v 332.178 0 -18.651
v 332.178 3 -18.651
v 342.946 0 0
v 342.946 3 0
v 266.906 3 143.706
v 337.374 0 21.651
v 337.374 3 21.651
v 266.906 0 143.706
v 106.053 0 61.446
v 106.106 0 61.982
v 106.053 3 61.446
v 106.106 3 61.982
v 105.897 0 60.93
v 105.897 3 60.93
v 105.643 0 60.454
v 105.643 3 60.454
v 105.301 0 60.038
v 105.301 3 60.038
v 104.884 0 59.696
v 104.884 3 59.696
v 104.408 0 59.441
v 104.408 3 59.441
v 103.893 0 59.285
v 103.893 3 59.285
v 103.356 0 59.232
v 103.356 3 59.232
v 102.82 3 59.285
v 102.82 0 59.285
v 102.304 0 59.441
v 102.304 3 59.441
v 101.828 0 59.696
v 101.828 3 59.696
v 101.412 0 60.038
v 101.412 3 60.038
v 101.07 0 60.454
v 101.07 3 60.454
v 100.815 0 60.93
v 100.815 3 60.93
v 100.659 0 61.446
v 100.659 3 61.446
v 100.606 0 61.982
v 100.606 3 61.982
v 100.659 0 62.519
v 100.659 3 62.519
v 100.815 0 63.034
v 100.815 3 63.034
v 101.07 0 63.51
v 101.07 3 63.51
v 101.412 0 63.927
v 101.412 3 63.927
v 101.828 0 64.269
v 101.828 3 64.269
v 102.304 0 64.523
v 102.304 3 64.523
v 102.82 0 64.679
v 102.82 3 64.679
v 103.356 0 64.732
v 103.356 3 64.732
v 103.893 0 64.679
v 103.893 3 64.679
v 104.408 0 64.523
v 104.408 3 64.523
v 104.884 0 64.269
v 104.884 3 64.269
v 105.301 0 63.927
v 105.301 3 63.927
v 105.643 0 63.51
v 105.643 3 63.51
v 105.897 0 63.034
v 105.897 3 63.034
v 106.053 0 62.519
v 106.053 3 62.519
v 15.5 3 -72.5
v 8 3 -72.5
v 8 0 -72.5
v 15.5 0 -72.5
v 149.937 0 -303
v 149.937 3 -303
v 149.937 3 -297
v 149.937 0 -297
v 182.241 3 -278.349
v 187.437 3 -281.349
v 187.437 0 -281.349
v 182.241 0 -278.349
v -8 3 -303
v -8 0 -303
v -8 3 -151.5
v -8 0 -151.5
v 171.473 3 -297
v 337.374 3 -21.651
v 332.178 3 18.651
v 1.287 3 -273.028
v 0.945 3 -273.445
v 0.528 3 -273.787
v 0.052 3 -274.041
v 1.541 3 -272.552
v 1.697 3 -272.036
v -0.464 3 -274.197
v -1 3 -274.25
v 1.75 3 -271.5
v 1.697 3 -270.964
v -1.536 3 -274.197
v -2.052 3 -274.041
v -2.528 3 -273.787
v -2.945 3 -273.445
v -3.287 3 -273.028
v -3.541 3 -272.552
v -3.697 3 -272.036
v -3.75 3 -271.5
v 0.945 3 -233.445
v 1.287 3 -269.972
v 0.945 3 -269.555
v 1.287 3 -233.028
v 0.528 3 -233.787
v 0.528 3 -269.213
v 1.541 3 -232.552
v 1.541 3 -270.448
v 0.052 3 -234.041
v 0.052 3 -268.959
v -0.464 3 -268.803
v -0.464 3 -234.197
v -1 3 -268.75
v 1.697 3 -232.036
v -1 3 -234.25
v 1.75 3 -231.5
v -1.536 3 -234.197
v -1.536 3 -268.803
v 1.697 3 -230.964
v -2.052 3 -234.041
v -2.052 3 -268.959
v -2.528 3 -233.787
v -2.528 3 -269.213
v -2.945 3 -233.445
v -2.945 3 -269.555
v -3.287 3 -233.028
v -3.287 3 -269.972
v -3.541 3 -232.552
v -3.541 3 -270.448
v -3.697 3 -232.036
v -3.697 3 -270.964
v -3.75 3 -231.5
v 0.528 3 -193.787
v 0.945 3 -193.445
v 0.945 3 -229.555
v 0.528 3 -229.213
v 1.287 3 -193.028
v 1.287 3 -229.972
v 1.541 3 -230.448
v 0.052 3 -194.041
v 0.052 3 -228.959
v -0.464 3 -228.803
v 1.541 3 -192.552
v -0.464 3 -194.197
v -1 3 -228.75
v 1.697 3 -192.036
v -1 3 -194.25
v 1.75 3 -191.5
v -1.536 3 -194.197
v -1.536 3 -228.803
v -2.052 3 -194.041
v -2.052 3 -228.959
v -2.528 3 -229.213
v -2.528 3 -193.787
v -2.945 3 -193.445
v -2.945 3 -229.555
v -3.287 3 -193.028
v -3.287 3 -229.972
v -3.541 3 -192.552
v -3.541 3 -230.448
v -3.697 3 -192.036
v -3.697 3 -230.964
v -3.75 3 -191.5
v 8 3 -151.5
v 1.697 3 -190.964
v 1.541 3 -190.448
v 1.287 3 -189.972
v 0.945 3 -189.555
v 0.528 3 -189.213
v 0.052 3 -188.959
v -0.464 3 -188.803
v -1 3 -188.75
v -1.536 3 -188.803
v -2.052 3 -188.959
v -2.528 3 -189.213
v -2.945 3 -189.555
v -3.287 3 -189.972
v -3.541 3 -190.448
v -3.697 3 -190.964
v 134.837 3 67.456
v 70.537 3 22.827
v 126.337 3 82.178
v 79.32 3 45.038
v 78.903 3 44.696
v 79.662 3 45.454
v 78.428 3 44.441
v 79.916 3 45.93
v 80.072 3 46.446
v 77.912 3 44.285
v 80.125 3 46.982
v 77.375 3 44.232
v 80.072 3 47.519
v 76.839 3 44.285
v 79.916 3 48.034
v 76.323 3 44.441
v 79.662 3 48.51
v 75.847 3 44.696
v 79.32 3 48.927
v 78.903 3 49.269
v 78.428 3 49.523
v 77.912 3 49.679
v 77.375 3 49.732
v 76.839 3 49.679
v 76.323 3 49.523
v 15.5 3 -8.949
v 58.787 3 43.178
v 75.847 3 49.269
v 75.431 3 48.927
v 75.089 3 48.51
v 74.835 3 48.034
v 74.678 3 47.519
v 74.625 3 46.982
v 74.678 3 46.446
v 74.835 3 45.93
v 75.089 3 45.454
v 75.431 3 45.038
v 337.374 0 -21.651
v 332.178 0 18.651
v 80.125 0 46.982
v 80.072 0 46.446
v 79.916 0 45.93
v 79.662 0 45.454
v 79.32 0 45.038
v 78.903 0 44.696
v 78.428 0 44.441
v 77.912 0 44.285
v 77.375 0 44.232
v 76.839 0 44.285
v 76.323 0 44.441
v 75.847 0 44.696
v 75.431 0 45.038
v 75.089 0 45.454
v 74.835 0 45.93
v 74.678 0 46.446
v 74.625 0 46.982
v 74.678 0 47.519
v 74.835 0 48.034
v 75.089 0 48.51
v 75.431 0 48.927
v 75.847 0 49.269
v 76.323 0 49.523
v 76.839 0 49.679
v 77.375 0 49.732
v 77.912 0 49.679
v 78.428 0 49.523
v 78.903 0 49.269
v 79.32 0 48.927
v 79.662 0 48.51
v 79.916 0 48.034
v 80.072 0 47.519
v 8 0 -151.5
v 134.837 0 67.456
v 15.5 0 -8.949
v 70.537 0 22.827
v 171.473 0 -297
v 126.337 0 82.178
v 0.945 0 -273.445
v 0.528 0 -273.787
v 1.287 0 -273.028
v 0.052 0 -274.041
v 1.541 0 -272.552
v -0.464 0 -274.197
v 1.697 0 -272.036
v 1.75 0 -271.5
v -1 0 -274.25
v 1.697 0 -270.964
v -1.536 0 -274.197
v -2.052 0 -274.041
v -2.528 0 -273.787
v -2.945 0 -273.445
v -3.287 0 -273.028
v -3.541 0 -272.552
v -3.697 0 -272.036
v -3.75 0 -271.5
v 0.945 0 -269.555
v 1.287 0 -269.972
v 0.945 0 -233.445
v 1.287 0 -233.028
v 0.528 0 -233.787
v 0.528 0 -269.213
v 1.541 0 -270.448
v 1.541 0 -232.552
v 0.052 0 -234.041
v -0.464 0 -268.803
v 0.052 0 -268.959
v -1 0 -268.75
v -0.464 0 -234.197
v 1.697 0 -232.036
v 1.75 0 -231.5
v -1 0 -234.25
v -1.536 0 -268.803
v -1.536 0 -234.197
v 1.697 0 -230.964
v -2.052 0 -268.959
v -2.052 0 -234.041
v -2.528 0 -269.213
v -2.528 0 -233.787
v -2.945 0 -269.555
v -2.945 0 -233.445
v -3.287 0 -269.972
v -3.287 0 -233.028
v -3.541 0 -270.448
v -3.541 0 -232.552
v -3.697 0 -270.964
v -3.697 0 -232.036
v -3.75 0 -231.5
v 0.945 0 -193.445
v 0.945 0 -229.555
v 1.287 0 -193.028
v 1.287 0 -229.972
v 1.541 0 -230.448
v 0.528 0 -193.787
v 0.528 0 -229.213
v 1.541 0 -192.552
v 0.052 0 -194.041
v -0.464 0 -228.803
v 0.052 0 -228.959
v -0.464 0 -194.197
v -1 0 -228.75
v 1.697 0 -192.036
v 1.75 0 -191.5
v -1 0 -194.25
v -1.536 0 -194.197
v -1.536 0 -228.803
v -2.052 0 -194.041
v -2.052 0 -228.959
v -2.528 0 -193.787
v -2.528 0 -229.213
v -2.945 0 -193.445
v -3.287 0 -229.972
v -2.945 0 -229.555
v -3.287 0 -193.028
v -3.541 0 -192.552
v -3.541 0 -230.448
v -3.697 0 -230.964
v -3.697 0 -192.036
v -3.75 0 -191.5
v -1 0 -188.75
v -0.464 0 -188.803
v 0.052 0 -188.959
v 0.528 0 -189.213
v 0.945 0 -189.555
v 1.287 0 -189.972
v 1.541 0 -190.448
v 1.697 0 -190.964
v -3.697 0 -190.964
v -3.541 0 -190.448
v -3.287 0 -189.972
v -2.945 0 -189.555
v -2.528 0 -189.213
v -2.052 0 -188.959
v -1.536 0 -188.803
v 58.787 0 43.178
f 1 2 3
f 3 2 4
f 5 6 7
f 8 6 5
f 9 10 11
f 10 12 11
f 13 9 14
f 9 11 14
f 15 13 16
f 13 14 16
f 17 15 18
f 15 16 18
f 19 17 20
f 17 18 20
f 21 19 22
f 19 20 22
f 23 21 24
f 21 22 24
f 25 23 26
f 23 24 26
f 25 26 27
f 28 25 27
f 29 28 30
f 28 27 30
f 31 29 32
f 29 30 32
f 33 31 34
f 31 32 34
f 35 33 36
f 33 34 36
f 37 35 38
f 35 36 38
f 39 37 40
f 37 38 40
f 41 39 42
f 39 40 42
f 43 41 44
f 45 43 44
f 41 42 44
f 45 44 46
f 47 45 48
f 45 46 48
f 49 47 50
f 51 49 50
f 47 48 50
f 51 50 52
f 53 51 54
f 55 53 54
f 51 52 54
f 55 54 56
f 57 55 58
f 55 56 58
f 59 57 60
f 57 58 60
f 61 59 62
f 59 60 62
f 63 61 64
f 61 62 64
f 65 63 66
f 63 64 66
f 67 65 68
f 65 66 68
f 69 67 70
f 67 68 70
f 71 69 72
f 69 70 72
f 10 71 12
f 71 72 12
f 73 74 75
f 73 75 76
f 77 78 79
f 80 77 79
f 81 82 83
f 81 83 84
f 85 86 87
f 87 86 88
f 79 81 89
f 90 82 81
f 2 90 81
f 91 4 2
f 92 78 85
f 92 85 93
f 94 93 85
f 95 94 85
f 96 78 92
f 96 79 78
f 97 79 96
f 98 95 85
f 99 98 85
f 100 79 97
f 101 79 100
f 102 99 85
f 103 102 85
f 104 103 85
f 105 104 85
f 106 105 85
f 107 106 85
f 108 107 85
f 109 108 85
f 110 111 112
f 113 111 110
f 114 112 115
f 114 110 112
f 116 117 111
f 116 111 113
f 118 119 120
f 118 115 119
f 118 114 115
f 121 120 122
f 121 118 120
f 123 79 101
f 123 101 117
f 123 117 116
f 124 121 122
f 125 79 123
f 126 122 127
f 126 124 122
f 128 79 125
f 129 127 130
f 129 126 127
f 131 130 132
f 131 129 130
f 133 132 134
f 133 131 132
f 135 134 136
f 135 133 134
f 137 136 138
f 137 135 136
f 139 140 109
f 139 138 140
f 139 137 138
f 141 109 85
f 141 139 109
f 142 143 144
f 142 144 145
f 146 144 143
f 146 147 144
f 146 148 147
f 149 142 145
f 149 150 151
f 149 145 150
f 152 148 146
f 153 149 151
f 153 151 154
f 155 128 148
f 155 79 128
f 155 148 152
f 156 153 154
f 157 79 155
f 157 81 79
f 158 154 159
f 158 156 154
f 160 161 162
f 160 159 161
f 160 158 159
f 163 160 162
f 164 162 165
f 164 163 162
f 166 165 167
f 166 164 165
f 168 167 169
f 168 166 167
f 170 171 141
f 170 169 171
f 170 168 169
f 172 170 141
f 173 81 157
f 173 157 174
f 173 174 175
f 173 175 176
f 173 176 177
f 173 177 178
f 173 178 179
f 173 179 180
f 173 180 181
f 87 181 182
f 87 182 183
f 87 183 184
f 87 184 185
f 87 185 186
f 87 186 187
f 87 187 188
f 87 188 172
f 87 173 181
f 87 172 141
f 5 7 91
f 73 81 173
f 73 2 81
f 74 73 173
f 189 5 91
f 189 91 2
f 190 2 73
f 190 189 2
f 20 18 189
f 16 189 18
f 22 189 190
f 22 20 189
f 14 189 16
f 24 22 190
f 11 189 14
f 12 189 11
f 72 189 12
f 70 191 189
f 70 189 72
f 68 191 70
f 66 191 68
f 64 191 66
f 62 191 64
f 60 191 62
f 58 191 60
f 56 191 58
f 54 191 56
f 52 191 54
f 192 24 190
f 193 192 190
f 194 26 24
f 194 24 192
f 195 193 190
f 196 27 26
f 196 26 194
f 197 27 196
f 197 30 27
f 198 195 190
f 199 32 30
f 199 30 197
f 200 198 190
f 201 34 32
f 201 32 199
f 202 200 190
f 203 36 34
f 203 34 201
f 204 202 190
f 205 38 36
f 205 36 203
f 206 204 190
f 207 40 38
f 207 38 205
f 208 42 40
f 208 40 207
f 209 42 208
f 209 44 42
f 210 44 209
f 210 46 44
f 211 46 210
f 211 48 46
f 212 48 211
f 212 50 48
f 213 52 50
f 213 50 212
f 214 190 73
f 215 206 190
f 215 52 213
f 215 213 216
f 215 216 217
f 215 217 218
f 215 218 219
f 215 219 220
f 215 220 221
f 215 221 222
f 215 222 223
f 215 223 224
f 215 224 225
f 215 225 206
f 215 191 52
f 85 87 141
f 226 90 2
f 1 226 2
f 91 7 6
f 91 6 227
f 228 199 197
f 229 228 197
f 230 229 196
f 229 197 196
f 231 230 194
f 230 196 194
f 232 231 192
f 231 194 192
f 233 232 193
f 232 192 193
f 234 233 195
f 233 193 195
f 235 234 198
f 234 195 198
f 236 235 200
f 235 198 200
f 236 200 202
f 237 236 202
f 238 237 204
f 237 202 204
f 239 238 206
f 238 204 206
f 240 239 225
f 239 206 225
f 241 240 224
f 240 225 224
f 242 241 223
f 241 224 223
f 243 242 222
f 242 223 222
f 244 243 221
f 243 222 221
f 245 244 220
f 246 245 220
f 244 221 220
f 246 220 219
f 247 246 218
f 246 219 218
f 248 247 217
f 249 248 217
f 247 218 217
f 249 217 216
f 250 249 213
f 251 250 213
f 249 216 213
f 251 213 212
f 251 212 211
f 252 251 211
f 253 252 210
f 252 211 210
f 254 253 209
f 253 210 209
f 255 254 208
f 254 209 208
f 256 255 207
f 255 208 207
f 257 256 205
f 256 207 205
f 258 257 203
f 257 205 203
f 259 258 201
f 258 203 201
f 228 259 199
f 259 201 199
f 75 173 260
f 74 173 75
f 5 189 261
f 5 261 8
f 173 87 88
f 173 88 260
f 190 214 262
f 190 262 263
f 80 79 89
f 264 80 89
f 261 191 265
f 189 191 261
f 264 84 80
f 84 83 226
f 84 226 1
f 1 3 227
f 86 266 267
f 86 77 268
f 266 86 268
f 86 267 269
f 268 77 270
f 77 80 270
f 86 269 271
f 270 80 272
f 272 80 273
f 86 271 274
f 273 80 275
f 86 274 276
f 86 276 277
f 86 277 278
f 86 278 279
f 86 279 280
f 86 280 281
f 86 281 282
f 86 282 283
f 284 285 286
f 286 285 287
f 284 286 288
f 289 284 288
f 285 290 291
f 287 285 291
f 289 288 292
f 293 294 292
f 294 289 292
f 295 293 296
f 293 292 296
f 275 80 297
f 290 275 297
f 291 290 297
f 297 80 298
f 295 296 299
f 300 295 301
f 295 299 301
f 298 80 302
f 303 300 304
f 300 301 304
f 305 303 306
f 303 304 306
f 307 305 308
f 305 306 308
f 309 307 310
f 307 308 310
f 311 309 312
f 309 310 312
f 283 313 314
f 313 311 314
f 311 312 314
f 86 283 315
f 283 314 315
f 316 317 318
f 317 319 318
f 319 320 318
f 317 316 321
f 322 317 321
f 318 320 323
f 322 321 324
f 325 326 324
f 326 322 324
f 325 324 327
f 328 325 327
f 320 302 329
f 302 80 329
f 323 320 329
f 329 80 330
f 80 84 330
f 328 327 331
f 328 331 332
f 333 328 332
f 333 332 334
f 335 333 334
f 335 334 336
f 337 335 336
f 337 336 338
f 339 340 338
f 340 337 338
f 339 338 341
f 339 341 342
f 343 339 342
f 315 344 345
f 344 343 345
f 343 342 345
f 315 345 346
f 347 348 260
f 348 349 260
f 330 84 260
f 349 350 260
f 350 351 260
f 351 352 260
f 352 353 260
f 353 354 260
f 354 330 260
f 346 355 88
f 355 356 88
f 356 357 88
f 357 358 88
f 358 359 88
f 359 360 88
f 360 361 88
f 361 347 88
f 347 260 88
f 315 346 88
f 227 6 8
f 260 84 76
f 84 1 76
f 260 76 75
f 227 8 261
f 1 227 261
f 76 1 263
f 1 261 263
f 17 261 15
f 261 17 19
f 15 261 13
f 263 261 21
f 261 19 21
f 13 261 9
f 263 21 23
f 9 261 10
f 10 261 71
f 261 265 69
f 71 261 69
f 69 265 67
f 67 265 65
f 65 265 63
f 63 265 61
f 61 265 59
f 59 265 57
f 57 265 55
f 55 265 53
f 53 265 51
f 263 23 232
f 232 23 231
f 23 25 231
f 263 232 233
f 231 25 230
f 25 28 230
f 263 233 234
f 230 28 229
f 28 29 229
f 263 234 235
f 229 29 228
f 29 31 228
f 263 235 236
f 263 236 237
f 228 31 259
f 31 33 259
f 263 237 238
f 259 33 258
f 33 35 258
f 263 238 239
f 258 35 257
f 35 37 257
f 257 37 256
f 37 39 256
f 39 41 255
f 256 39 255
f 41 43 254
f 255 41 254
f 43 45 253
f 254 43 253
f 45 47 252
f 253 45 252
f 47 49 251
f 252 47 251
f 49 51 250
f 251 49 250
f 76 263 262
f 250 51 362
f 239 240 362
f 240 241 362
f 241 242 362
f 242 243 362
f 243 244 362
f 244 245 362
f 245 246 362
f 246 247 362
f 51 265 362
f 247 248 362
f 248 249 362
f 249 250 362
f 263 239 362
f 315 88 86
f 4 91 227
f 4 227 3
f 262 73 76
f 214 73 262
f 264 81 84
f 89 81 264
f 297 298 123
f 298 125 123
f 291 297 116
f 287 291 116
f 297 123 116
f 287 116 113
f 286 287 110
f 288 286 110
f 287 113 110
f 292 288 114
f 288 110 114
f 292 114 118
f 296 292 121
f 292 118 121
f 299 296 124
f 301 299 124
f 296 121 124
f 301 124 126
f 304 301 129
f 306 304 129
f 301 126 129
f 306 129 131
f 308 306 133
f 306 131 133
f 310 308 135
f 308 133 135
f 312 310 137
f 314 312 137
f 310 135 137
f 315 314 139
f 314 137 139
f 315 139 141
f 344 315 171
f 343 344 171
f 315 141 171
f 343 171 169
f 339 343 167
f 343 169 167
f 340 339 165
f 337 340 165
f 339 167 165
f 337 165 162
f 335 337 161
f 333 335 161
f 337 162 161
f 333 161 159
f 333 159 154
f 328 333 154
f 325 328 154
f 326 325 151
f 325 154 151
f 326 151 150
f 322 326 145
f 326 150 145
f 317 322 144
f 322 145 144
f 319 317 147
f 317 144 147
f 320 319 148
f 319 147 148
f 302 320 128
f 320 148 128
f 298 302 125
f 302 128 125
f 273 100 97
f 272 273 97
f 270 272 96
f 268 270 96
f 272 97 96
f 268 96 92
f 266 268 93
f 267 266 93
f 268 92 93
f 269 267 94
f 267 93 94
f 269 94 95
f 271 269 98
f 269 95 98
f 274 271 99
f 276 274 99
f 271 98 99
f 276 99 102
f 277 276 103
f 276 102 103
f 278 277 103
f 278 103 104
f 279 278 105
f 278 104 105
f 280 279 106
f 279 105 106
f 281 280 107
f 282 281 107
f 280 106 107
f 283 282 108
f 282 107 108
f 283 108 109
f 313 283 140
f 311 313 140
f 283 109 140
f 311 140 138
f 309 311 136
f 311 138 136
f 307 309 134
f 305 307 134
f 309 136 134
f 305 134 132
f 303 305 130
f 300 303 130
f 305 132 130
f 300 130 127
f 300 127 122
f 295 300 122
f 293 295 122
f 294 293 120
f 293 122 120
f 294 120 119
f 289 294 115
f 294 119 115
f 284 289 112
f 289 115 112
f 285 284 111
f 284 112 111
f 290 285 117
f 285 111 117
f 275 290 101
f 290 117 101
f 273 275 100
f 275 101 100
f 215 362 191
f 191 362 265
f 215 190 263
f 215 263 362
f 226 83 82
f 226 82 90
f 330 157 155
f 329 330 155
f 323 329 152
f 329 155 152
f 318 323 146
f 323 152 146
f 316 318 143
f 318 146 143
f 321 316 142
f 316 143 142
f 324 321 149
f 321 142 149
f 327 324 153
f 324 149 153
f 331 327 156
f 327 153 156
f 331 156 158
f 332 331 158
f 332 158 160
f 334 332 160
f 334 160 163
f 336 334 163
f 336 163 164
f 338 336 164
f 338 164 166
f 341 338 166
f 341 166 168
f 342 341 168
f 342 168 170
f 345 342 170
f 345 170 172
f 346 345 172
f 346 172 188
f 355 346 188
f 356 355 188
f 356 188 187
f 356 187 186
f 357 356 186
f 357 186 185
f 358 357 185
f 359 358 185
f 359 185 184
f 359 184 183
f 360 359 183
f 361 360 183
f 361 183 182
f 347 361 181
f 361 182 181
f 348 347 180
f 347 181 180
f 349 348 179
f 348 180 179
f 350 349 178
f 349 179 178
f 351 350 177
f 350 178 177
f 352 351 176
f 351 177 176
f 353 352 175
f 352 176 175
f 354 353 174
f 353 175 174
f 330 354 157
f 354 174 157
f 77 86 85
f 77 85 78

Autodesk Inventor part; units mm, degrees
ref_plane "YZ Plane" through (0, 0, 0) normal (1, 0, 0) x (0, 1, 0)
ref_plane "XZ Plane" through (0, 0, 0) normal (0, 1, 0) x (-1, 0, 0)
ref_plane "XY Plane" through (0, 0, 0) normal (0, 0, 1) x (1, 0, 0)
sketch "Sketch1" plane through (0, 0, 0) normal (0, 1, 0) x (-1, 0, 0)
  line L0 (349.8743, 0) -> (258.4057, -158.4282)
  line L1 (174.9371, -303) -> (-174.9371, -303)
  line L2 (-174.9371, -303) -> (-349.8743, 0)
  line L3 (-349.8743, 0) -> (-174.9371, 303)
  line L4 (-174.9371, 303) -> (174.9371, 303)
  line L5 (258.4057, 158.4282) -> (349.8743, 0)
  line L6 (0, 0) -> (-8, 0)
  line L7 (-8, 0) -> (-8, -303)
  line L8 (-8, -303) -> (8, -303)
  line L9 (8, -303) -> (8, 0)
  line L10 (8, 0) -> (-8, 0)
  circle A0 centre (0, 0) radius 2.5
  line L11 (258.4057, 158.4282) -> (-4, 6.9282)
  line L12 (4, -6.9282) -> (266.4057, 144.5718)
  line L13 (-4, 6.9282) -> (4, -6.9282)
  line L14 (-266.4057, 144.5718) -> (-4, -6.9282)
  line L15 (4, 6.9282) -> (-258.4057, 158.4282)
  line L16 (-4, -6.9282) -> (4, 6.9282)
  line L17 (8, -4.6188) -> (8, -151.5)
  line L18 (8, -151.5) -> (-8, -151.5)
  line L19 (-8, -151.5) -> (-8, -303)
  line L20 (-8, -4.6188) -> (-4, -6.9282)
  line L21 (4, -6.9282) -> (-4, -6.9282)
  line L22 (-266.4057, 144.5718) -> (-258.4057, 158.4282)
  line L23 (-127.2028, 82.6782) -> (-135.2028, 68.8218)
  line L24 (-135.2028, 68.8218) -> (-8, -4.6188)
  line L25 (-266.4057, 144.5718) -> (-349.8743, 0)
  line L26 (-174.9371, -303) -> (-349.8743, 0)
  line L27 (-174.9371, -303) -> (-8, -303)
  line L28 (0, 9.2376) -> (8, 0)
  dimension "d0" = 303
  dimension "d1" = 303
  dimension "d2" = 8
  dimension "d3" = 16
  dimension "d4" = 5
  dimension "d7" = 360
extrude "Extrusion1" add sketch "Sketch1" along normal blind 3 contours L1 L7 L18 L9 | L1 L2 L3 L14 L7 | L18 L7 L14 L21 L12 L9 | L12 L13 A0 L10 L9 | L14 L23 L15 L11 L13 A0 L6 L7 | L7 L6 A0 L16 L14 | L10 A0 L16 L28 | L21 L16 A0 L13 | L3 L15 L23 L14 | A0 L13 L10 | L10 L16 A0 | L28 L15 L16 | L16 A0 L13 L11 L28 | A0 L16 L13 | A0 L13 L6 | L6 L16 A0 | L13 A0 L16
sketch "Sketch2" plane through (0, 3, 0) normal (0, 1, 0) x (1, 0, 0)
  line L0 (-8, 303) -> (-8, 0) projected
  line L1 (-8, 0) -> (-8, 151.5)
  line L2 (-8, 151.5) -> (8, 151.5)
  line L3 (8, 151.5) -> (8, 0)
  line L4 (8, 0) -> (-8, 0)
  line L5 (0, -9.2376) -> (258.4057, -158.4282) projected
  line L6 (258.4057, -158.4282) -> (126.3368, -82.1782)
  line L7 (126.3368, -82.1782) -> (134.8368, -67.4558)
  line L8 (134.8368, -67.4558) -> (266.9057, -143.7058)
  line L9 (266.9057, -143.7058) -> (258.4057, -158.4282)
  point P0 (0, 0)
  dimension "d11" = 151.5
  dimension "d12" = 16
  dimension "d13" = 152.5
  dimension "d14" = 17
extrude "Extrusion2" cut sketch "Sketch2" against normal blind 3
sketch "Sketch3" plane through (0, 3, 0) normal (0, 1, 0) x (1, 0, 0)
  line L0 (174.9371, 303) -> (-8, 303) projected
  line L1 (174.9371, 303) -> (149.9371, 303)
  line L2 (149.9371, 303) -> (149.9371, 297)
  line L3 (149.9371, 297) -> (174.9371, 297)
  line L4 (174.9371, 297) -> (174.9371, 303)
  line L5 (349.8743, 0) -> (174.9371, 303) projected
  line L6 (174.9371, 303) -> (187.4371, 281.3494)
  line L7 (187.4371, 281.3494) -> (182.241, 278.3494)
  line L8 (182.241, 278.3494) -> (169.741, 300)
  line L9 (169.741, 300) -> (174.9371, 303)
  line L10 (349.8743, 0) -> (337.3743, 21.6506)
  line L11 (337.3743, 21.6506) -> (332.1781, 18.6506)
  line L12 (332.1781, 18.6506) -> (344.6781, -3)
  line L13 (344.6781, -3) -> (349.8743, 0)
  line L14 (349.8743, 0) -> (337.3743, -21.6506)
  line L15 (337.3743, -21.6506) -> (332.1781, -18.6506)
  line L16 (332.1781, -18.6506) -> (344.6781, 3)
  line L17 (344.6781, 3) -> (349.8743, 0)
  line L18 (349.8743, 0) -> (266.9057, -143.7058) projected
  line L19 (349.8743, 0) -> (374.8743, 0) construction
  point P0 (0, 0)
  dimension "d17" = 25
  dimension "d18" = 6
  dimension "d19" = 25
  dimension "d20" = 6
  dimension "d21" = 25
  dimension "d22" = 6
  dimension "d23" = 25
  dimension "d24" = 120
  dimension "d25" = 6
extrude "Extrusion3" cut sketch "Sketch3" against normal blind 3
sketch "Sketch4" plane through (0, 3, 0) normal (0, 1, 0) x (1, 0, 0)
  line L0 (-55.0368, 49.6734) -> (70.5368, -22.8266)
  line L1 (70.5368, -22.8266) -> (55.0368, -49.6734)
  line L2 (55.0368, -49.6734) -> (-70.5368, 22.8266)
  line L3 (-70.5368, 22.8266) -> (-55.0368, 49.6734)
  line L4 (-55.0368, 49.6734) -> (55.0368, -49.6734) construction
  line L5 (70.5368, -22.8266) -> (-70.5368, 22.8266) construction
  line L6 (-55.0368, 49.6734) -> (89.9632, 49.6734) construction
  line L7 (-15.5, -72.5) -> (-15.5, 72.5)
  line L8 (-15.5, 72.5) -> (15.5, 72.5)
  line L9 (15.5, 72.5) -> (15.5, -72.5)
  line L10 (15.5, -72.5) -> (-15.5, -72.5)
  line L11 (-15.5, -72.5) -> (15.5, 72.5) construction
  line L12 (-15.5, 72.5) -> (15.5, -72.5) construction
  line L13 (-8, 0) -> (8, 0) projected
  line L14 (-15.5, -72.5) -> (129.5, -72.5) construction
  point P0 (0, 0)
  dimension "d28" = 145
  dimension "d29" = 30
  dimension "d30" = 31
  dimension "d31" = 145
  dimension "d32" = 90
  dimension "d33" = 31
extrude "Extrusion4" cut sketch "Sketch4" against normal blind 3
sketch "Sketch5" plane through (0, 3, 0) normal (0, 1, 0) x (1, 0, 0)
  line L0 (-1, 151.5) -> (-1, 191.5)
  circle A0 centre (-1, 191.5) radius 2.75
  circle A1 centre (-1, 231.5) radius 2.75
  circle A2 centre (-1, 271.5) radius 2.75
  circle A3 centre (0, 0) radius 0.5
  line L1 (126.3368, -82.1782) -> (134.8368, -67.4558) projected
  line L2 (126.3368, -82.1782) -> (129.3368, -76.9821)
  line L3 (129.3368, -76.9821) -> (103.3561, -61.9821)
  line L4 (103.3561, -61.9821) -> (77.3753, -46.9821)
  circle A4 centre (103.3561, -61.9821) radius 2.75
  circle A5 centre (77.3753, -46.9821) radius 2.75
  line L5 (-8, 303) -> (-8, 151.5) projected
  dimension "d36" = 40
  dimension "d37" = 5.5
  dimension "d40" = 40
  dimension "d45" = 1
  dimension "d46" = 6
  dimension "d47" = 30
  dimension "d48" = 30
  dimension "d49" = 5.5
  dimension "d50" = 5.5
  dimension "d53" = 7
extrude "Extrusion5" cut sketch "Sketch5" against normal blind 3 contours A0 | A1 | A2 | A4 L4 L3 | A5 | L3 L4 A4
sketch "Sketch6" plane through (0, 3, 0) normal (0, 1, 0) x (1, 0, 0)
  line L0 (-8, 303) -> (-8, 151.5) projected
  line L1 (-8, 303) -> (344, 303)
  line L2 (344, 303) -> (344, -147)
  line L3 (344, -147) -> (-8, -147)
  line L4 (-8, -147) -> (-8, 303)
  point P0 (0, 0)
  dimension "d54" = 352
  dimension "d55" = 450
properties part number "Acrylic_bottom"
